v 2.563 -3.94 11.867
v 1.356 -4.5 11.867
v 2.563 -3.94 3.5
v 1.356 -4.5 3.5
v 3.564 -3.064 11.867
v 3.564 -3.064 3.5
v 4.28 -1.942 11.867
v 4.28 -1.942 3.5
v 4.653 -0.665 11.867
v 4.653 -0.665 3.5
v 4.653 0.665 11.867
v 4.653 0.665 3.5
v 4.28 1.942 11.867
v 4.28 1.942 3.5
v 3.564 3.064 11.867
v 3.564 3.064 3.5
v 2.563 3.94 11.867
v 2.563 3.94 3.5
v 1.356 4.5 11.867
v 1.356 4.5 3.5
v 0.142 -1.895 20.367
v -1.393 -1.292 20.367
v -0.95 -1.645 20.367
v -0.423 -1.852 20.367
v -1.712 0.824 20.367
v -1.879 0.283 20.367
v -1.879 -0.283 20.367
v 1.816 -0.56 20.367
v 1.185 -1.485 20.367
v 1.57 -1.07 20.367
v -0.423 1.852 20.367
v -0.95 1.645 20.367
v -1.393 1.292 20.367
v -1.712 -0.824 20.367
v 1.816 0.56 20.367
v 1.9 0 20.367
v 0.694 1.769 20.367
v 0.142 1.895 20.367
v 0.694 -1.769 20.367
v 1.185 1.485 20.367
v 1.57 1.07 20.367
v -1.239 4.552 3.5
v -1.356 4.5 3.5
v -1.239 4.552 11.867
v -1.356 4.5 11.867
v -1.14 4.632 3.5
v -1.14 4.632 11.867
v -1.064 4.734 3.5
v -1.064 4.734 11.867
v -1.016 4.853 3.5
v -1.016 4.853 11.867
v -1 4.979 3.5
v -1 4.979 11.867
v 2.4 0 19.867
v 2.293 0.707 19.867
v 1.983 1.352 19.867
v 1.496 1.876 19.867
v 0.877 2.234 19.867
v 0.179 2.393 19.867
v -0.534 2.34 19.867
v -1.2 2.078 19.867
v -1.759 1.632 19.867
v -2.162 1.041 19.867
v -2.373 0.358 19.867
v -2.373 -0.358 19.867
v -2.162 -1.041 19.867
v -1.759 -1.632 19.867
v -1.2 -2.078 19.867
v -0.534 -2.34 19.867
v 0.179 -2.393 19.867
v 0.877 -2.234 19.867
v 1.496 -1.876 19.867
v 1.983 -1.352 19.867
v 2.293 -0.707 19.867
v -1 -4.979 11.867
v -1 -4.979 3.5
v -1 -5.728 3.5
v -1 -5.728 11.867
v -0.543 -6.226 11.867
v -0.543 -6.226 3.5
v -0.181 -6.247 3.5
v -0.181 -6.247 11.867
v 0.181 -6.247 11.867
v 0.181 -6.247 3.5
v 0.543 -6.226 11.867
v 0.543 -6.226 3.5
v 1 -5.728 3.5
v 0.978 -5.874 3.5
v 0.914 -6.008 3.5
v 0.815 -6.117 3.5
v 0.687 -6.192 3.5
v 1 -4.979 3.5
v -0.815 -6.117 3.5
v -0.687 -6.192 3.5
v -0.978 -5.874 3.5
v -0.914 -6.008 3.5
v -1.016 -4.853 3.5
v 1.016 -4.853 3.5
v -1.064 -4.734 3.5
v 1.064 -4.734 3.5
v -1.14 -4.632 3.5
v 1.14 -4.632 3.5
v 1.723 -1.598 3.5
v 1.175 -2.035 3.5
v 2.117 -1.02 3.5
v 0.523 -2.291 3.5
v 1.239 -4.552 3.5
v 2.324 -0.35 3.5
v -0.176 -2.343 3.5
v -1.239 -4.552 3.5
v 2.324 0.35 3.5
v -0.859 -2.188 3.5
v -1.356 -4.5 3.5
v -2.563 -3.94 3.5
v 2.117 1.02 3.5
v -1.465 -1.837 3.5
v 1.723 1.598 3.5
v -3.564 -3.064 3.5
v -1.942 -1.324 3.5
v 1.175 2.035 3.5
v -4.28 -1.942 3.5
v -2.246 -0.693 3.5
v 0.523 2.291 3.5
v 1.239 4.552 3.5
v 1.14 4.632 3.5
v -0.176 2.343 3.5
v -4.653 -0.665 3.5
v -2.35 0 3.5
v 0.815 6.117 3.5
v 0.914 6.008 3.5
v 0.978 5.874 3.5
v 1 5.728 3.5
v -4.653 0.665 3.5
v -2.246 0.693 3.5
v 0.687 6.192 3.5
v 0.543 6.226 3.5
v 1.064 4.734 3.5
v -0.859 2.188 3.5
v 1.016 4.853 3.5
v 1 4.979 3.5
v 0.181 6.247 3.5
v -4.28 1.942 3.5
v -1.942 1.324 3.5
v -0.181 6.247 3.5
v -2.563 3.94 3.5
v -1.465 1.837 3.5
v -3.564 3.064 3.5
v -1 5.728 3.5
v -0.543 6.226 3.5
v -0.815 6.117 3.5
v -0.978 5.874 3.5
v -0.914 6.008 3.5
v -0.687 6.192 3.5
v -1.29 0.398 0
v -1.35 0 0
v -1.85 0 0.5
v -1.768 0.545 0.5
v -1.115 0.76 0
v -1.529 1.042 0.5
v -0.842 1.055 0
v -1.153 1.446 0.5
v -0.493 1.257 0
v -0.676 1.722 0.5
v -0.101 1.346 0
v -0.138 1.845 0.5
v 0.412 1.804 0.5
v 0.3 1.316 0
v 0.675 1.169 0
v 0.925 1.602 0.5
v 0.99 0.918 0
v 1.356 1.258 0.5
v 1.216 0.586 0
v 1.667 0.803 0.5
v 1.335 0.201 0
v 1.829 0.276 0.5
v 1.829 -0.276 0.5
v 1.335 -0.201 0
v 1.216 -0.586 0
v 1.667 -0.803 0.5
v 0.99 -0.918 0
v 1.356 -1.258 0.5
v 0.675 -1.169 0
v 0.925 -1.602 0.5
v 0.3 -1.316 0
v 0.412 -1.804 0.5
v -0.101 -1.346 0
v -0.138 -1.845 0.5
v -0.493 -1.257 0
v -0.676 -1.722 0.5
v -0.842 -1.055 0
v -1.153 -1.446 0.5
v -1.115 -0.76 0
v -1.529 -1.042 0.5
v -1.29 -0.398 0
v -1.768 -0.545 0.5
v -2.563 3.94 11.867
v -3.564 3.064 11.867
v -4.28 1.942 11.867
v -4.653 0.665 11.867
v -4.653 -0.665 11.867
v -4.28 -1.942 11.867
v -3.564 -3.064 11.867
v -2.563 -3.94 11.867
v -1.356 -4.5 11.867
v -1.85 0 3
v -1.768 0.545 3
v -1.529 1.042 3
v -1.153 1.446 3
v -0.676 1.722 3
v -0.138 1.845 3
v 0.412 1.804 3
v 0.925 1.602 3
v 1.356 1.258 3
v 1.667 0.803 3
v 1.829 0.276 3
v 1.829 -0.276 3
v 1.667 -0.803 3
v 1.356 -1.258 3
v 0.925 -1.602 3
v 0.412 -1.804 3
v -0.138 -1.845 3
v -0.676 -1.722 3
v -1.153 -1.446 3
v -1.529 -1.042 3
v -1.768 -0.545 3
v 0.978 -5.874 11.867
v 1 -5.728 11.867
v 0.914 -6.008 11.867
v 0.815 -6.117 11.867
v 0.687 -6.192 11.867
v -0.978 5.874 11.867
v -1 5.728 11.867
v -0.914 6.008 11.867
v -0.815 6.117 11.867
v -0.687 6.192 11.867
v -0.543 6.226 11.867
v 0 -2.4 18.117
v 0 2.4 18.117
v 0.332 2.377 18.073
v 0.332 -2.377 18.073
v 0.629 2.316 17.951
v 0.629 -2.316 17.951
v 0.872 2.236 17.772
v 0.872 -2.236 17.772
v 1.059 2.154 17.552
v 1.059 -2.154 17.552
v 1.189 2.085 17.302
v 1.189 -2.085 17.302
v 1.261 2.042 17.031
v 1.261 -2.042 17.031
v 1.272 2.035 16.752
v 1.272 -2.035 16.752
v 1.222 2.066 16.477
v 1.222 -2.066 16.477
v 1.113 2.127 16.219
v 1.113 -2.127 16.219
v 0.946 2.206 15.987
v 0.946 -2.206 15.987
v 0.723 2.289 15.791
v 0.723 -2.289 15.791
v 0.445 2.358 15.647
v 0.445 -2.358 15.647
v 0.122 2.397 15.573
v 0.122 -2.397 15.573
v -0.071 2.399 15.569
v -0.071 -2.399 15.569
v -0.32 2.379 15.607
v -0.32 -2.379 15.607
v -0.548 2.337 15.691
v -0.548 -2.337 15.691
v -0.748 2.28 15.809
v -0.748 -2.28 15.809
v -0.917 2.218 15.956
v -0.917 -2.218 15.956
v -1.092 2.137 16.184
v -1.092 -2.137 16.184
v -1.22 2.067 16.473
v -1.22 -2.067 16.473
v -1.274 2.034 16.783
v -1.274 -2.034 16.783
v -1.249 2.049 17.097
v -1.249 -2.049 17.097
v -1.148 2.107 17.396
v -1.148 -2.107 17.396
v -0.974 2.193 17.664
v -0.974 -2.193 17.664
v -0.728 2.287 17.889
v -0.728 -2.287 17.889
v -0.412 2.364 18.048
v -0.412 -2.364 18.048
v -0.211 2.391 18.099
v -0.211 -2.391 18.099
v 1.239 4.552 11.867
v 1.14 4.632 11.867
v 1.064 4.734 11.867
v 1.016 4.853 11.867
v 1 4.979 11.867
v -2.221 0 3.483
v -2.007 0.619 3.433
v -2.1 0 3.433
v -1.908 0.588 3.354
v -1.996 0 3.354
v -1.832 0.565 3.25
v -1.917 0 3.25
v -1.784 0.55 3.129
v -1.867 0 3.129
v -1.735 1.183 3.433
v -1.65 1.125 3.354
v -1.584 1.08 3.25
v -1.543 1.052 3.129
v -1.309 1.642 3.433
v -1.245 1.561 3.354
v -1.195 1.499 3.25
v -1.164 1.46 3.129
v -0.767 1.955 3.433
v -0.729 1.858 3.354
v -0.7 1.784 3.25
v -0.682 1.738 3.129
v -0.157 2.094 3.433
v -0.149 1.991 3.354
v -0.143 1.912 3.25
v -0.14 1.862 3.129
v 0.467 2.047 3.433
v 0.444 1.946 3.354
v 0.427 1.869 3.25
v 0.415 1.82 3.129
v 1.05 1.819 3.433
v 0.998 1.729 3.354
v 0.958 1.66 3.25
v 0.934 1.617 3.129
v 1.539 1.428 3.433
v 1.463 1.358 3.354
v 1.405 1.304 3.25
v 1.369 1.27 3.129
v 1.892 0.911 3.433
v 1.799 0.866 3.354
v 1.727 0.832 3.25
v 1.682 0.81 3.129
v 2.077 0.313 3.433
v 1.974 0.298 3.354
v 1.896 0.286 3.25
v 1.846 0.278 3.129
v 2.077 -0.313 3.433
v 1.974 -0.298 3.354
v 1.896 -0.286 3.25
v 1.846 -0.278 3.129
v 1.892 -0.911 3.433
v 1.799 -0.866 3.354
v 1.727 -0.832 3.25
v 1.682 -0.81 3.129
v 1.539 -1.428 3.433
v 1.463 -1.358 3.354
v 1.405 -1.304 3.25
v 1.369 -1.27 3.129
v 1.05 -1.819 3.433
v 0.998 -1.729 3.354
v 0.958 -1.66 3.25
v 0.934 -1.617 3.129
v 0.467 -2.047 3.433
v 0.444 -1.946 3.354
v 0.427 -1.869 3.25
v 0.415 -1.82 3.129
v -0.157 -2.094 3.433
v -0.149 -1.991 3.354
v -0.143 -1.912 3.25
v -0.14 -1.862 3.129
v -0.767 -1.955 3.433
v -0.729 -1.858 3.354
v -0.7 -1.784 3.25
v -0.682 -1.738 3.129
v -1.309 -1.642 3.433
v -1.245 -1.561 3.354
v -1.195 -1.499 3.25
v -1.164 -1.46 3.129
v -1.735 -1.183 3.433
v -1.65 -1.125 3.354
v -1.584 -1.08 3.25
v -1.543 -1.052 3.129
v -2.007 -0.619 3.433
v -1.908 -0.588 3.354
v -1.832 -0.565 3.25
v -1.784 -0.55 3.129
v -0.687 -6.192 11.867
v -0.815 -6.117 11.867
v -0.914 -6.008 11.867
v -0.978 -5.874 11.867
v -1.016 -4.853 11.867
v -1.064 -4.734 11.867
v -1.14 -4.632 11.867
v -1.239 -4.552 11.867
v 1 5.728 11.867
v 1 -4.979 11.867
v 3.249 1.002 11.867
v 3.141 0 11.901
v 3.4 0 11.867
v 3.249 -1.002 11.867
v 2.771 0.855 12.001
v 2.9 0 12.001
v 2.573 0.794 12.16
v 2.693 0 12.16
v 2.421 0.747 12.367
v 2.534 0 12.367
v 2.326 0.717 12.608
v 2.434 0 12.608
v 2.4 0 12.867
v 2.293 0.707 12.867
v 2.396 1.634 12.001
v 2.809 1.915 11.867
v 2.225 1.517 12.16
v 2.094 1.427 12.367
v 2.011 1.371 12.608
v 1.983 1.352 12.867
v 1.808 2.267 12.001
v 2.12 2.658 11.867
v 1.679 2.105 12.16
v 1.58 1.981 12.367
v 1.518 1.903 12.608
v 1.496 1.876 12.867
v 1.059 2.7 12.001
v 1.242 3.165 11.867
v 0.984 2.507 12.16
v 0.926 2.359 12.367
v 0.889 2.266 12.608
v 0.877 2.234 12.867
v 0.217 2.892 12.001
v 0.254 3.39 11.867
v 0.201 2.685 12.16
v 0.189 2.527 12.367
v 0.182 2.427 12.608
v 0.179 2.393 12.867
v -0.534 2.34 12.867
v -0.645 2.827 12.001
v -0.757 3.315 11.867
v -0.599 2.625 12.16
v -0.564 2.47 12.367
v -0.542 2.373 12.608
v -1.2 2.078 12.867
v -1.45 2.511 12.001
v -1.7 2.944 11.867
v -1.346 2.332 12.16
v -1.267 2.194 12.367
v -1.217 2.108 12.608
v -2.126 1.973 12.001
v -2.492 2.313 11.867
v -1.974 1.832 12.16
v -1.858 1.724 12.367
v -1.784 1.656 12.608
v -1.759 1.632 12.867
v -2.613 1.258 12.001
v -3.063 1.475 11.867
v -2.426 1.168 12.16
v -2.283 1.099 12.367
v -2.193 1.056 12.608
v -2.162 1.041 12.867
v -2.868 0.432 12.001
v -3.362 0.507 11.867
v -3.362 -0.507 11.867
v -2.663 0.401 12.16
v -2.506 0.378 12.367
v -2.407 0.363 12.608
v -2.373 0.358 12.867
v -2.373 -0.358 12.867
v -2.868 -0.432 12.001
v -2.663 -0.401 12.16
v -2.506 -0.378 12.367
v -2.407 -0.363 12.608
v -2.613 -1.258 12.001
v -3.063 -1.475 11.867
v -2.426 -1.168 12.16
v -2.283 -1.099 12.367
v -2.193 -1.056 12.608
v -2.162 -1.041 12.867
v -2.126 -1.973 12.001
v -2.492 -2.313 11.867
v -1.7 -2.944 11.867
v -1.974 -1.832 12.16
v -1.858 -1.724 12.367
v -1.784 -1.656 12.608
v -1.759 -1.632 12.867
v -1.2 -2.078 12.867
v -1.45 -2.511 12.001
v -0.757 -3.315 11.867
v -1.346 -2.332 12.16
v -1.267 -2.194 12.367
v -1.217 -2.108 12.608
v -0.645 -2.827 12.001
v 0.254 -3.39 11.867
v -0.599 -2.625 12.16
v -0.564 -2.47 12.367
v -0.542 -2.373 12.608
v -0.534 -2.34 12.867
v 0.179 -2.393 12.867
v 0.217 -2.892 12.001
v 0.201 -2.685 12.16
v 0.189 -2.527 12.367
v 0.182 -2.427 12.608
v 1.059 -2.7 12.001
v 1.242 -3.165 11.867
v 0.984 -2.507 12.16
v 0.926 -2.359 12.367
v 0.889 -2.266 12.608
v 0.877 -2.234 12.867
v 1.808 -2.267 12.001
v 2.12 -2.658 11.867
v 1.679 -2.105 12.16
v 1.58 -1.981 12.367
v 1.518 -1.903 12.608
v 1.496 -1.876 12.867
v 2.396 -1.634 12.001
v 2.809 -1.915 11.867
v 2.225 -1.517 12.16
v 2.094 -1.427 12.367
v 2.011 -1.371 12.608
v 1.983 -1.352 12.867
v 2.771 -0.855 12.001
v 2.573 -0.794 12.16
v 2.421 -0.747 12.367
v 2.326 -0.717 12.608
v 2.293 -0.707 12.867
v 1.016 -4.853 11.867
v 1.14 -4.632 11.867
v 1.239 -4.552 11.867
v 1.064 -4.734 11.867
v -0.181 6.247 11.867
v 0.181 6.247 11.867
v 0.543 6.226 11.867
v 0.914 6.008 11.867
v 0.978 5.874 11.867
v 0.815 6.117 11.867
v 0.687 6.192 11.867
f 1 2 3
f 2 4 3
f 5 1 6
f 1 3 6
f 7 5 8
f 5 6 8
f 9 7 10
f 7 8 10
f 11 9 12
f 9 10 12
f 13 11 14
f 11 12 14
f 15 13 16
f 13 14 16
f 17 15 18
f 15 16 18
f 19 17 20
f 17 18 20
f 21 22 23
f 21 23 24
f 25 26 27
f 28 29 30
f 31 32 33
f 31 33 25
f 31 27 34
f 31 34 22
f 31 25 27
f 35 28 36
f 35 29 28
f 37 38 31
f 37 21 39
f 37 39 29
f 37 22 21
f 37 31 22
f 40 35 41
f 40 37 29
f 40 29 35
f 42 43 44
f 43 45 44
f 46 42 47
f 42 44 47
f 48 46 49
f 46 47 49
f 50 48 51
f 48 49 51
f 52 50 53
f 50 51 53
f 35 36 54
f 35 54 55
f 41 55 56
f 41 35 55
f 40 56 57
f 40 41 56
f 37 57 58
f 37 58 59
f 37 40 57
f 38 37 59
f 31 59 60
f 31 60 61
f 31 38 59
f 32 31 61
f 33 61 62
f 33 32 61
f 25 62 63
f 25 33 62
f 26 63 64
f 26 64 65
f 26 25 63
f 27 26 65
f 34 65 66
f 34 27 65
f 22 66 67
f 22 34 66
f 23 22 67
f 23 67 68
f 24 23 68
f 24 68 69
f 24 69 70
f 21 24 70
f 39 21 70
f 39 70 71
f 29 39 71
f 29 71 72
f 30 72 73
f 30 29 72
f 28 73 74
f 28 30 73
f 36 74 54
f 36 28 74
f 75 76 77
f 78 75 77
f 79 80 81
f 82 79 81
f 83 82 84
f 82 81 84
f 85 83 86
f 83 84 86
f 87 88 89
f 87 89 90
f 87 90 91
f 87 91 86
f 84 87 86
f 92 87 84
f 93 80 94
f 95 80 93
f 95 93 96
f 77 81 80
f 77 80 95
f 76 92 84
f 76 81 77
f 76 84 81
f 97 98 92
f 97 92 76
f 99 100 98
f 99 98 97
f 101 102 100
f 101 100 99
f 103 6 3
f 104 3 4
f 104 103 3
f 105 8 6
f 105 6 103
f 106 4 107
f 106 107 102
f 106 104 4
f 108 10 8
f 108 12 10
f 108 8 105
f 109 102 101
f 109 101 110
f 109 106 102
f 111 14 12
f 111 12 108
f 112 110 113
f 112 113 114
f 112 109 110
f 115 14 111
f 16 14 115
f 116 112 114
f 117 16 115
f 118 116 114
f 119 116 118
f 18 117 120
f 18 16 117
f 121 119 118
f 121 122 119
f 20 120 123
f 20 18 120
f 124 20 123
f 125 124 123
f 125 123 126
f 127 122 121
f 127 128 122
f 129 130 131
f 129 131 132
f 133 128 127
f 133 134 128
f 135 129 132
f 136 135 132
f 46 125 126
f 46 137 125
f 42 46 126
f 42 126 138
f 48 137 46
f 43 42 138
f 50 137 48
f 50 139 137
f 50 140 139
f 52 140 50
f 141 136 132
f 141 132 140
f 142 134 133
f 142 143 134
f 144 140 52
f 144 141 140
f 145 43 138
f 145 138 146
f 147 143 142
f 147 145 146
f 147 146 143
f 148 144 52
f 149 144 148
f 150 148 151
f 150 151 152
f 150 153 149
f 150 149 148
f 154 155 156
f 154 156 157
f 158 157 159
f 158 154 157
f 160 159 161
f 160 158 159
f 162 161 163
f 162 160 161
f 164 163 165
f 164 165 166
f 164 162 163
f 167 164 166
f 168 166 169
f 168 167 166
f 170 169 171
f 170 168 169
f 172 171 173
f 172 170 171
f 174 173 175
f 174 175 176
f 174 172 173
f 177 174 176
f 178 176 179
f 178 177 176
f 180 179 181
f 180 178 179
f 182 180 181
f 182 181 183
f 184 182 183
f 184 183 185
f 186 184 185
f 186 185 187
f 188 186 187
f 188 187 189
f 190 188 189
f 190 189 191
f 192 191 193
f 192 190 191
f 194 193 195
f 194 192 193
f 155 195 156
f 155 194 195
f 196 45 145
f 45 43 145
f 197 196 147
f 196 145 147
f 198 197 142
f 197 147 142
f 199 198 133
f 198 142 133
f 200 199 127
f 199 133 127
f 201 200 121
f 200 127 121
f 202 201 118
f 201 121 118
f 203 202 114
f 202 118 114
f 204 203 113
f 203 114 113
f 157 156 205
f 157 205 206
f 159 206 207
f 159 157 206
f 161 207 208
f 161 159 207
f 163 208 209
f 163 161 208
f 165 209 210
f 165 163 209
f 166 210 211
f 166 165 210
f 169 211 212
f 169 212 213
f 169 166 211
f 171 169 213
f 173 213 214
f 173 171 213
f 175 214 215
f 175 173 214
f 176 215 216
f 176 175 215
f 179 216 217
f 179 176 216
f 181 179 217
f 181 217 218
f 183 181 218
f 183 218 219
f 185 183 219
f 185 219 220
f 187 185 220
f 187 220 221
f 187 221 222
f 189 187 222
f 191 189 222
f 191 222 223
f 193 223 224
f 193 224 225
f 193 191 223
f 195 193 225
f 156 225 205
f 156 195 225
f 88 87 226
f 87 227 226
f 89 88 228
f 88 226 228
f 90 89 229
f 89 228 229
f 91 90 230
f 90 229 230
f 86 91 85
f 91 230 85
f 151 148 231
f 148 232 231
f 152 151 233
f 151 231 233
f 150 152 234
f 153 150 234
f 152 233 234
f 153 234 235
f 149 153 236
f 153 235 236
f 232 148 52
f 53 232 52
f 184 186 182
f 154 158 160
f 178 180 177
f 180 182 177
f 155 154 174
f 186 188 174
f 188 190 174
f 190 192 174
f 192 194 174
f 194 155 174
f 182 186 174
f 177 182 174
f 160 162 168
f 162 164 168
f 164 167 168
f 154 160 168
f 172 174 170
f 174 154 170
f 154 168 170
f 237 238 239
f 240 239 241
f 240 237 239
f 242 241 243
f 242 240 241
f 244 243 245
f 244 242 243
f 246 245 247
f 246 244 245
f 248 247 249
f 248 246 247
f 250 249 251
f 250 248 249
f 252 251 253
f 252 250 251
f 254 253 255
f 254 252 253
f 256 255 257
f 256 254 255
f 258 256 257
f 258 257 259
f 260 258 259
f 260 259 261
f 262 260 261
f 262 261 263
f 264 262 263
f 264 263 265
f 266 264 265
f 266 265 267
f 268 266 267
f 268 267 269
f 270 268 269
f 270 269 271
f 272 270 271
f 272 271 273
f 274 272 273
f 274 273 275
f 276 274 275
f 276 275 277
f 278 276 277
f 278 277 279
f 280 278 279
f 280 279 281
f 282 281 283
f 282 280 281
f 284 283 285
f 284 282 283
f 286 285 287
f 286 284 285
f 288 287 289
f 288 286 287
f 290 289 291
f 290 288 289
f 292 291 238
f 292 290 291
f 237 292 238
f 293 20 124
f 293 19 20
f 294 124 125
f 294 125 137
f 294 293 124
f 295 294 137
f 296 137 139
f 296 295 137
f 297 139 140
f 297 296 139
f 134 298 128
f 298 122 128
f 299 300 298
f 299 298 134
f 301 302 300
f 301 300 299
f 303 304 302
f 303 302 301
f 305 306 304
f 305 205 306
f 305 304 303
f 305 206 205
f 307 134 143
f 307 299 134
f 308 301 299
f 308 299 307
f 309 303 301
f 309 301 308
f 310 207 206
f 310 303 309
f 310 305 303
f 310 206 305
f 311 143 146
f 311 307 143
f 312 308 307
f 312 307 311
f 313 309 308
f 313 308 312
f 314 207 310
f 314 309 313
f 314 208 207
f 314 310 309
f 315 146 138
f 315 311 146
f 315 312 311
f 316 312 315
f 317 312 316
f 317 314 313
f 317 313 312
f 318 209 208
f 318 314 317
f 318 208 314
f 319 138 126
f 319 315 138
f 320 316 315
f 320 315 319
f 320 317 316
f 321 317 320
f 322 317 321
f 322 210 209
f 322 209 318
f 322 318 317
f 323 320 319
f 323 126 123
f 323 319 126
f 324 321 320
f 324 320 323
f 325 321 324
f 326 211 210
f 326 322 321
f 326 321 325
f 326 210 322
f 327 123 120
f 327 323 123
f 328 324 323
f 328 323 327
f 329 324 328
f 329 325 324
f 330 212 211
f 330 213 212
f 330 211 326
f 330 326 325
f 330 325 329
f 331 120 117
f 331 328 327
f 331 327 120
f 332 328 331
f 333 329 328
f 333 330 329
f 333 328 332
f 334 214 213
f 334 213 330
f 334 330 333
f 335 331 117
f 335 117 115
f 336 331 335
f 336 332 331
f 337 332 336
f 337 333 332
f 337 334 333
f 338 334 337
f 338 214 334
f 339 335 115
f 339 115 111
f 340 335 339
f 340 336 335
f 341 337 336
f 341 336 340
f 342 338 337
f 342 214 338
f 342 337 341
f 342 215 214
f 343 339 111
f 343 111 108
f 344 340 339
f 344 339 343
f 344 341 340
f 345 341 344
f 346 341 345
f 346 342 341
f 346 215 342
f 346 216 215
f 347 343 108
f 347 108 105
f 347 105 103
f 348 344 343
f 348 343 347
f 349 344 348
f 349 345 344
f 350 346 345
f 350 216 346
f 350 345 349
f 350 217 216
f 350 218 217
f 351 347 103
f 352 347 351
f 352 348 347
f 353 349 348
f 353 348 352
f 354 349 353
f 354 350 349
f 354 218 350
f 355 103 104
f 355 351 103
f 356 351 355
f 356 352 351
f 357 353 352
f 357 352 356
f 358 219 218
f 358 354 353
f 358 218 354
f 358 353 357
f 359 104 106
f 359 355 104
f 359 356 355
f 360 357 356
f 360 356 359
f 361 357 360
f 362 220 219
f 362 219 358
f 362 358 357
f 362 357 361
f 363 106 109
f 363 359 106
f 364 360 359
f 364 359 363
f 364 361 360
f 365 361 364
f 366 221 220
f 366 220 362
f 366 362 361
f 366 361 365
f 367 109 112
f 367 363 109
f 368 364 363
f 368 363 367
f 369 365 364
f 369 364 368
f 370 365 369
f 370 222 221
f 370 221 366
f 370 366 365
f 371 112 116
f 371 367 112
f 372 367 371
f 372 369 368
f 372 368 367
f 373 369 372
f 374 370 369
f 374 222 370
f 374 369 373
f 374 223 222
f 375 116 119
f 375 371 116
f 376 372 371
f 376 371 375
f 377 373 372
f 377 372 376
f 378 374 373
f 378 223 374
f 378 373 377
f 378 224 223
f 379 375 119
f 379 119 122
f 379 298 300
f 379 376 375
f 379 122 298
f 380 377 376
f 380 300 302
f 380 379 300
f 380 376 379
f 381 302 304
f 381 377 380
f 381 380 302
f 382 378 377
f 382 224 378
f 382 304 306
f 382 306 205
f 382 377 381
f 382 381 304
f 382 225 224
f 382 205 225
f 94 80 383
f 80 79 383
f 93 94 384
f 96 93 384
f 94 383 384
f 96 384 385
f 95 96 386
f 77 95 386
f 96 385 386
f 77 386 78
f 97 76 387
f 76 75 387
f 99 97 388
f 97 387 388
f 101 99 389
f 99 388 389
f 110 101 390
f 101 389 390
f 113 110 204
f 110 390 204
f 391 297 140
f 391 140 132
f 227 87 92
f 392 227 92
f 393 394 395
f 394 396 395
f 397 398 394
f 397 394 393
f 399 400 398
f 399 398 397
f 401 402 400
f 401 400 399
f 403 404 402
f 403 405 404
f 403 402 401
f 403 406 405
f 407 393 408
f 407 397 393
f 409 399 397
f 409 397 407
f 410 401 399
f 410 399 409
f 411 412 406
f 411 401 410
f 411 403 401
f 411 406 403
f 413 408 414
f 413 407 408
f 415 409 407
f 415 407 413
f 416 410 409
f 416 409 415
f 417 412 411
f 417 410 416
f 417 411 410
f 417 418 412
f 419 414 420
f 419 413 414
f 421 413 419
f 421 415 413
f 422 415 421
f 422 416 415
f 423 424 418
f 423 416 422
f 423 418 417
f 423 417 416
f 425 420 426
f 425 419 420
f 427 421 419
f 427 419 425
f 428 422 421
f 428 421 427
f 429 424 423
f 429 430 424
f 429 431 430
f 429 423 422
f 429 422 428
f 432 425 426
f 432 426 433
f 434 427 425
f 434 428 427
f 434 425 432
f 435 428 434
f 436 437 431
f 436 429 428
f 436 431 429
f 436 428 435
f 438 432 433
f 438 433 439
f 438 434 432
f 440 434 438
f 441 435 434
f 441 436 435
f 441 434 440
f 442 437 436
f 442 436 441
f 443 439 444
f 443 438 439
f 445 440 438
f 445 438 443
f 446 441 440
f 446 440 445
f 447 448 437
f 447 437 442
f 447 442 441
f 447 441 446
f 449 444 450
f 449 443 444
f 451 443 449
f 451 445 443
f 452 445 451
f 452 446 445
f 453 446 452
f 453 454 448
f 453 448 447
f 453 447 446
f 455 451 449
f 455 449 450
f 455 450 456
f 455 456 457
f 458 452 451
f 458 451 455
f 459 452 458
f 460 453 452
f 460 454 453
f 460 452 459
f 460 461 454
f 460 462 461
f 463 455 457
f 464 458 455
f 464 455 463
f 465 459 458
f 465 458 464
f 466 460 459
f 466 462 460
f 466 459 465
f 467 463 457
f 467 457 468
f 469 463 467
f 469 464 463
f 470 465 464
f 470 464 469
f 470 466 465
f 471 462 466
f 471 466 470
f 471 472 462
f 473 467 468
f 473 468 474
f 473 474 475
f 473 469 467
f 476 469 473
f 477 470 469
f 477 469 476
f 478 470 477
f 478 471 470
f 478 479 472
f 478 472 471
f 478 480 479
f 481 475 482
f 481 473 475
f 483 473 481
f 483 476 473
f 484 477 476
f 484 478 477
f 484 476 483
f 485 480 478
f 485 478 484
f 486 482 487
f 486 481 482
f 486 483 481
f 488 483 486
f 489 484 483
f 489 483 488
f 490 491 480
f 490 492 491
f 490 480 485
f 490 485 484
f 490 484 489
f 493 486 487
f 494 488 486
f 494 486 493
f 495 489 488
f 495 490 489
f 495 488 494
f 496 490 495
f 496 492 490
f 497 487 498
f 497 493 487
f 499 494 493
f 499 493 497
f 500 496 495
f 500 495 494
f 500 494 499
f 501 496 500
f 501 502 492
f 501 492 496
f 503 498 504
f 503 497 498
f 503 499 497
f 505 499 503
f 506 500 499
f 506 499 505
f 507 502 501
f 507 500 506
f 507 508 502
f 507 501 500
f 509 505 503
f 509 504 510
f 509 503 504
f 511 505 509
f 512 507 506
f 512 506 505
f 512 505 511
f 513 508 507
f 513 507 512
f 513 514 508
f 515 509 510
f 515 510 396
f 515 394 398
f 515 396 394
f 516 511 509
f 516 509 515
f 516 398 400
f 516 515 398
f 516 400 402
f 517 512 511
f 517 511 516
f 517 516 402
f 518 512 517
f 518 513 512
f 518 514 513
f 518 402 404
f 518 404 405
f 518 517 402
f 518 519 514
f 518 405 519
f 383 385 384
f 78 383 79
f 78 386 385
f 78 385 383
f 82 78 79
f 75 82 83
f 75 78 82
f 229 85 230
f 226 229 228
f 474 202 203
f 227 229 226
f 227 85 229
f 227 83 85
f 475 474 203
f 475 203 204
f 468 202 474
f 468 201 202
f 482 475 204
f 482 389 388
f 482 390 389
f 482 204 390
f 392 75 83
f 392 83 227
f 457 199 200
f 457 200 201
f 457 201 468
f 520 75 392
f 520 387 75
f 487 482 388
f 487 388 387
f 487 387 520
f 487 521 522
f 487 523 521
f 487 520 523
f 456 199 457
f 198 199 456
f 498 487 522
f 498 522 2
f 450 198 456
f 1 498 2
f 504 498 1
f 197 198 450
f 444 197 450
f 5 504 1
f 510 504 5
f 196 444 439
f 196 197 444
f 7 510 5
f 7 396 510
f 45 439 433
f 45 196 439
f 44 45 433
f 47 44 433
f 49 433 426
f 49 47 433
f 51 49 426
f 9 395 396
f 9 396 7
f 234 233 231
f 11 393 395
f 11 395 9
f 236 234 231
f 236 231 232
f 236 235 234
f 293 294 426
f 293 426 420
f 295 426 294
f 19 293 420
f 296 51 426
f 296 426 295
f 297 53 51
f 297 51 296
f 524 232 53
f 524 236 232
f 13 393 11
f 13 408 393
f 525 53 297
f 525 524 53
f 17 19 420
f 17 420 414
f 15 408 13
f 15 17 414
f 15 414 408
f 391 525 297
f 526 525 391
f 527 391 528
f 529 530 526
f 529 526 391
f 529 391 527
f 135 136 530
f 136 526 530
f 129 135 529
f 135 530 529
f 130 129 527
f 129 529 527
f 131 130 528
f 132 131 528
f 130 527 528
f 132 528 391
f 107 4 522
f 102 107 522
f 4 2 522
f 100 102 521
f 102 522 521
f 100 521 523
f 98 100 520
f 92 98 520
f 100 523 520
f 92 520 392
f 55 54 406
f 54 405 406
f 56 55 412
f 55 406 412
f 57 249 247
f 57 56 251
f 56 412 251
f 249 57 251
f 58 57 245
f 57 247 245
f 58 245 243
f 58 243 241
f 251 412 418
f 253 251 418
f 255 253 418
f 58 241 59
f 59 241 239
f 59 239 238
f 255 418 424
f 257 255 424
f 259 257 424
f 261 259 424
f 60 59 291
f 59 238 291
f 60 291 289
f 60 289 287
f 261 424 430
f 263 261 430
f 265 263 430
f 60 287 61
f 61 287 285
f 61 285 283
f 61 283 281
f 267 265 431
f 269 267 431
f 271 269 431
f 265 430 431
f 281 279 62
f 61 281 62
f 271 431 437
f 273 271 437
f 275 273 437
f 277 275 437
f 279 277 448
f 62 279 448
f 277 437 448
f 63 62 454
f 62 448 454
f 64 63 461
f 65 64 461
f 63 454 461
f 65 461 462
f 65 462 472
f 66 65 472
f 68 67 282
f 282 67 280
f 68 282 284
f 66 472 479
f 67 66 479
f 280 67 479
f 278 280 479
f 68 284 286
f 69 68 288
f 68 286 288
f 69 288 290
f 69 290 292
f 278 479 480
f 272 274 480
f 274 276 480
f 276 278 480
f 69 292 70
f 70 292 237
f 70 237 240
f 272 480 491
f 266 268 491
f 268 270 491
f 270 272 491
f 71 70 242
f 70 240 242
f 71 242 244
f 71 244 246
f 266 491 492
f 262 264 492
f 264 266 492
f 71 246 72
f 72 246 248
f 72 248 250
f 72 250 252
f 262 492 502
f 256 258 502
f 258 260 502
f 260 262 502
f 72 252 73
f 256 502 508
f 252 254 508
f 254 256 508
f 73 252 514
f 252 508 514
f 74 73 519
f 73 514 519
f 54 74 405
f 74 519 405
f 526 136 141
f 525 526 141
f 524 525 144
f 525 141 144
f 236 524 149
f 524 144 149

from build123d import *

# Parameters (mm, degrees)
SKETCH1_R               = 4.7
BOSS_EXTRUDE1_DEPTH     = 11.866666667
SKETCH2_OUTSIDE_W       = 14.964
SKETCH2_OUTSIDE_H       = 14.964
SKETCH2_OUTSIDE_R       = 1.85
CUT_EXTRUDE1_DEPTH      = 3.5
BOSS_EXTRUDE2_START     = -8.366666667
BOSS_EXTRUDE2_DEPTH     = 8.366666667
FILLET1_R               = 0.5
FILLET2_R               = 0.5
SKETCH4_R               = 2.4
BOSS_EXTRUDE3_DEPTH     = 8.5
FILLET3_R               = 1
CHAMFER1_SIZE           = 0.5
CUT_EXTRUDE2_DEPTH      = 22.816361088
CUT_EXTRUDE2_DEPTH_BACK = 22.816361088
SKETCH5_R               = 1.275


with BuildPart() as part:
    # Sketch1 → Boss-Extrude1 (new body)
    with BuildSketch(Plane.XY):
        Circle(SKETCH1_R)
    extrude(amount=BOSS_EXTRUDE1_DEPTH)

    # Sketch2 outside → Cut-Extrude1 (cut)
    with BuildSketch(Plane(origin=(0, 0, 0), x_dir=(-1, 0, 0), z_dir=(0, 0, -1))):
        Rectangle(SKETCH2_OUTSIDE_W, SKETCH2_OUTSIDE_H)
        Circle(SKETCH2_OUTSIDE_R, mode=Mode.SUBTRACT)
    extrude(amount=-CUT_EXTRUDE1_DEPTH, mode=Mode.SUBTRACT)

    # Sketch3 → Boss-Extrude2 (add)
    with BuildSketch(Plane.XY.offset(11.866666667).offset(BOSS_EXTRUDE2_START)):
        with BuildLine():
            Line((-1, 6.16948134), (-1, 4.592385001))
            ThreePointArc((-1, 4.592385001), (0, 4.7), (1, 4.592385001))
            Line((1, 4.592385001), (1, 6.16948134))
            ThreePointArc((1, 6.16948134), (0, 6.25), (-1, 6.16948134))
        make_face()
        with BuildLine():
            ThreePointArc((1, -4.592385001), (0, -4.7), (-1, -4.592385001))
            Line((-1, -4.592385001), (-1, -6.16948134))
            ThreePointArc((-1, -6.16948134), (0, -6.25), (1, -6.16948134))
            Line((1, -6.16948134), (1, -4.592385001))
        make_face()
    extrude(amount=BOSS_EXTRUDE2_DEPTH)

    # Fillet1
    fillet1_edges = [part.edges().sort_by_distance(p)[0] for p in [
        (-1, 6.16948134, 7.683333333),
        (-1, 4.592385001, 7.683333333),
        (1, 4.592385001, 7.683333333),
        (1, 6.16948134, 7.683333333),
        (1, -6.16948134, 7.683333333),
        (1, -4.592385001, 7.683333333),
        (-1, -4.592385001, 7.683333333),
        (-1, -6.16948134, 7.683333333),
    ]]
    fillet(fillet1_edges, radius=FILLET1_R)

    # Fillet2
    fillet2_edges = [part.edges().sort_by_distance(p)[0] for p in [
        (1.85, 0, 3.5),
    ]]
    fillet(fillet2_edges, radius=FILLET2_R)

    # Sketch4 → Boss-Extrude3 (add)
    with BuildSketch(Plane.XY.offset(11.866666667)):
        Circle(SKETCH4_R)
    extrude(amount=BOSS_EXTRUDE3_DEPTH)

    # Fillet3
    fillet3_edges = [part.edges().sort_by_distance(p)[0] for p in [
        (-2.4, 0, 11.866666667),
    ]]
    fillet(fillet3_edges, radius=FILLET3_R)

    # Chamfer1
    chamfer1_edges = [part.edges().sort_by_distance(p)[0] for p in [
        (1.85, 0, 0),
        (-2.4, 0, 20.366666667),
    ]]
    chamfer(chamfer1_edges, length=CHAMFER1_SIZE)

    # Sketch5 → Cut-Extrude2 (cut, two sides: drawn at the far end of the back side and taken through both)
    with BuildSketch(Plane(origin=(0, 0, 0), x_dir=(1, 0, 0), z_dir=(0, 1, 0)).offset(-CUT_EXTRUDE2_DEPTH_BACK)):
        with Locations(Location((0, -16.841666667, 0), (0, 0, 270))):
            Circle(SKETCH5_R)
    extrude(amount=CUT_EXTRUDE2_DEPTH + CUT_EXTRUDE2_DEPTH_BACK, mode=Mode.SUBTRACT)


solid = part.part
